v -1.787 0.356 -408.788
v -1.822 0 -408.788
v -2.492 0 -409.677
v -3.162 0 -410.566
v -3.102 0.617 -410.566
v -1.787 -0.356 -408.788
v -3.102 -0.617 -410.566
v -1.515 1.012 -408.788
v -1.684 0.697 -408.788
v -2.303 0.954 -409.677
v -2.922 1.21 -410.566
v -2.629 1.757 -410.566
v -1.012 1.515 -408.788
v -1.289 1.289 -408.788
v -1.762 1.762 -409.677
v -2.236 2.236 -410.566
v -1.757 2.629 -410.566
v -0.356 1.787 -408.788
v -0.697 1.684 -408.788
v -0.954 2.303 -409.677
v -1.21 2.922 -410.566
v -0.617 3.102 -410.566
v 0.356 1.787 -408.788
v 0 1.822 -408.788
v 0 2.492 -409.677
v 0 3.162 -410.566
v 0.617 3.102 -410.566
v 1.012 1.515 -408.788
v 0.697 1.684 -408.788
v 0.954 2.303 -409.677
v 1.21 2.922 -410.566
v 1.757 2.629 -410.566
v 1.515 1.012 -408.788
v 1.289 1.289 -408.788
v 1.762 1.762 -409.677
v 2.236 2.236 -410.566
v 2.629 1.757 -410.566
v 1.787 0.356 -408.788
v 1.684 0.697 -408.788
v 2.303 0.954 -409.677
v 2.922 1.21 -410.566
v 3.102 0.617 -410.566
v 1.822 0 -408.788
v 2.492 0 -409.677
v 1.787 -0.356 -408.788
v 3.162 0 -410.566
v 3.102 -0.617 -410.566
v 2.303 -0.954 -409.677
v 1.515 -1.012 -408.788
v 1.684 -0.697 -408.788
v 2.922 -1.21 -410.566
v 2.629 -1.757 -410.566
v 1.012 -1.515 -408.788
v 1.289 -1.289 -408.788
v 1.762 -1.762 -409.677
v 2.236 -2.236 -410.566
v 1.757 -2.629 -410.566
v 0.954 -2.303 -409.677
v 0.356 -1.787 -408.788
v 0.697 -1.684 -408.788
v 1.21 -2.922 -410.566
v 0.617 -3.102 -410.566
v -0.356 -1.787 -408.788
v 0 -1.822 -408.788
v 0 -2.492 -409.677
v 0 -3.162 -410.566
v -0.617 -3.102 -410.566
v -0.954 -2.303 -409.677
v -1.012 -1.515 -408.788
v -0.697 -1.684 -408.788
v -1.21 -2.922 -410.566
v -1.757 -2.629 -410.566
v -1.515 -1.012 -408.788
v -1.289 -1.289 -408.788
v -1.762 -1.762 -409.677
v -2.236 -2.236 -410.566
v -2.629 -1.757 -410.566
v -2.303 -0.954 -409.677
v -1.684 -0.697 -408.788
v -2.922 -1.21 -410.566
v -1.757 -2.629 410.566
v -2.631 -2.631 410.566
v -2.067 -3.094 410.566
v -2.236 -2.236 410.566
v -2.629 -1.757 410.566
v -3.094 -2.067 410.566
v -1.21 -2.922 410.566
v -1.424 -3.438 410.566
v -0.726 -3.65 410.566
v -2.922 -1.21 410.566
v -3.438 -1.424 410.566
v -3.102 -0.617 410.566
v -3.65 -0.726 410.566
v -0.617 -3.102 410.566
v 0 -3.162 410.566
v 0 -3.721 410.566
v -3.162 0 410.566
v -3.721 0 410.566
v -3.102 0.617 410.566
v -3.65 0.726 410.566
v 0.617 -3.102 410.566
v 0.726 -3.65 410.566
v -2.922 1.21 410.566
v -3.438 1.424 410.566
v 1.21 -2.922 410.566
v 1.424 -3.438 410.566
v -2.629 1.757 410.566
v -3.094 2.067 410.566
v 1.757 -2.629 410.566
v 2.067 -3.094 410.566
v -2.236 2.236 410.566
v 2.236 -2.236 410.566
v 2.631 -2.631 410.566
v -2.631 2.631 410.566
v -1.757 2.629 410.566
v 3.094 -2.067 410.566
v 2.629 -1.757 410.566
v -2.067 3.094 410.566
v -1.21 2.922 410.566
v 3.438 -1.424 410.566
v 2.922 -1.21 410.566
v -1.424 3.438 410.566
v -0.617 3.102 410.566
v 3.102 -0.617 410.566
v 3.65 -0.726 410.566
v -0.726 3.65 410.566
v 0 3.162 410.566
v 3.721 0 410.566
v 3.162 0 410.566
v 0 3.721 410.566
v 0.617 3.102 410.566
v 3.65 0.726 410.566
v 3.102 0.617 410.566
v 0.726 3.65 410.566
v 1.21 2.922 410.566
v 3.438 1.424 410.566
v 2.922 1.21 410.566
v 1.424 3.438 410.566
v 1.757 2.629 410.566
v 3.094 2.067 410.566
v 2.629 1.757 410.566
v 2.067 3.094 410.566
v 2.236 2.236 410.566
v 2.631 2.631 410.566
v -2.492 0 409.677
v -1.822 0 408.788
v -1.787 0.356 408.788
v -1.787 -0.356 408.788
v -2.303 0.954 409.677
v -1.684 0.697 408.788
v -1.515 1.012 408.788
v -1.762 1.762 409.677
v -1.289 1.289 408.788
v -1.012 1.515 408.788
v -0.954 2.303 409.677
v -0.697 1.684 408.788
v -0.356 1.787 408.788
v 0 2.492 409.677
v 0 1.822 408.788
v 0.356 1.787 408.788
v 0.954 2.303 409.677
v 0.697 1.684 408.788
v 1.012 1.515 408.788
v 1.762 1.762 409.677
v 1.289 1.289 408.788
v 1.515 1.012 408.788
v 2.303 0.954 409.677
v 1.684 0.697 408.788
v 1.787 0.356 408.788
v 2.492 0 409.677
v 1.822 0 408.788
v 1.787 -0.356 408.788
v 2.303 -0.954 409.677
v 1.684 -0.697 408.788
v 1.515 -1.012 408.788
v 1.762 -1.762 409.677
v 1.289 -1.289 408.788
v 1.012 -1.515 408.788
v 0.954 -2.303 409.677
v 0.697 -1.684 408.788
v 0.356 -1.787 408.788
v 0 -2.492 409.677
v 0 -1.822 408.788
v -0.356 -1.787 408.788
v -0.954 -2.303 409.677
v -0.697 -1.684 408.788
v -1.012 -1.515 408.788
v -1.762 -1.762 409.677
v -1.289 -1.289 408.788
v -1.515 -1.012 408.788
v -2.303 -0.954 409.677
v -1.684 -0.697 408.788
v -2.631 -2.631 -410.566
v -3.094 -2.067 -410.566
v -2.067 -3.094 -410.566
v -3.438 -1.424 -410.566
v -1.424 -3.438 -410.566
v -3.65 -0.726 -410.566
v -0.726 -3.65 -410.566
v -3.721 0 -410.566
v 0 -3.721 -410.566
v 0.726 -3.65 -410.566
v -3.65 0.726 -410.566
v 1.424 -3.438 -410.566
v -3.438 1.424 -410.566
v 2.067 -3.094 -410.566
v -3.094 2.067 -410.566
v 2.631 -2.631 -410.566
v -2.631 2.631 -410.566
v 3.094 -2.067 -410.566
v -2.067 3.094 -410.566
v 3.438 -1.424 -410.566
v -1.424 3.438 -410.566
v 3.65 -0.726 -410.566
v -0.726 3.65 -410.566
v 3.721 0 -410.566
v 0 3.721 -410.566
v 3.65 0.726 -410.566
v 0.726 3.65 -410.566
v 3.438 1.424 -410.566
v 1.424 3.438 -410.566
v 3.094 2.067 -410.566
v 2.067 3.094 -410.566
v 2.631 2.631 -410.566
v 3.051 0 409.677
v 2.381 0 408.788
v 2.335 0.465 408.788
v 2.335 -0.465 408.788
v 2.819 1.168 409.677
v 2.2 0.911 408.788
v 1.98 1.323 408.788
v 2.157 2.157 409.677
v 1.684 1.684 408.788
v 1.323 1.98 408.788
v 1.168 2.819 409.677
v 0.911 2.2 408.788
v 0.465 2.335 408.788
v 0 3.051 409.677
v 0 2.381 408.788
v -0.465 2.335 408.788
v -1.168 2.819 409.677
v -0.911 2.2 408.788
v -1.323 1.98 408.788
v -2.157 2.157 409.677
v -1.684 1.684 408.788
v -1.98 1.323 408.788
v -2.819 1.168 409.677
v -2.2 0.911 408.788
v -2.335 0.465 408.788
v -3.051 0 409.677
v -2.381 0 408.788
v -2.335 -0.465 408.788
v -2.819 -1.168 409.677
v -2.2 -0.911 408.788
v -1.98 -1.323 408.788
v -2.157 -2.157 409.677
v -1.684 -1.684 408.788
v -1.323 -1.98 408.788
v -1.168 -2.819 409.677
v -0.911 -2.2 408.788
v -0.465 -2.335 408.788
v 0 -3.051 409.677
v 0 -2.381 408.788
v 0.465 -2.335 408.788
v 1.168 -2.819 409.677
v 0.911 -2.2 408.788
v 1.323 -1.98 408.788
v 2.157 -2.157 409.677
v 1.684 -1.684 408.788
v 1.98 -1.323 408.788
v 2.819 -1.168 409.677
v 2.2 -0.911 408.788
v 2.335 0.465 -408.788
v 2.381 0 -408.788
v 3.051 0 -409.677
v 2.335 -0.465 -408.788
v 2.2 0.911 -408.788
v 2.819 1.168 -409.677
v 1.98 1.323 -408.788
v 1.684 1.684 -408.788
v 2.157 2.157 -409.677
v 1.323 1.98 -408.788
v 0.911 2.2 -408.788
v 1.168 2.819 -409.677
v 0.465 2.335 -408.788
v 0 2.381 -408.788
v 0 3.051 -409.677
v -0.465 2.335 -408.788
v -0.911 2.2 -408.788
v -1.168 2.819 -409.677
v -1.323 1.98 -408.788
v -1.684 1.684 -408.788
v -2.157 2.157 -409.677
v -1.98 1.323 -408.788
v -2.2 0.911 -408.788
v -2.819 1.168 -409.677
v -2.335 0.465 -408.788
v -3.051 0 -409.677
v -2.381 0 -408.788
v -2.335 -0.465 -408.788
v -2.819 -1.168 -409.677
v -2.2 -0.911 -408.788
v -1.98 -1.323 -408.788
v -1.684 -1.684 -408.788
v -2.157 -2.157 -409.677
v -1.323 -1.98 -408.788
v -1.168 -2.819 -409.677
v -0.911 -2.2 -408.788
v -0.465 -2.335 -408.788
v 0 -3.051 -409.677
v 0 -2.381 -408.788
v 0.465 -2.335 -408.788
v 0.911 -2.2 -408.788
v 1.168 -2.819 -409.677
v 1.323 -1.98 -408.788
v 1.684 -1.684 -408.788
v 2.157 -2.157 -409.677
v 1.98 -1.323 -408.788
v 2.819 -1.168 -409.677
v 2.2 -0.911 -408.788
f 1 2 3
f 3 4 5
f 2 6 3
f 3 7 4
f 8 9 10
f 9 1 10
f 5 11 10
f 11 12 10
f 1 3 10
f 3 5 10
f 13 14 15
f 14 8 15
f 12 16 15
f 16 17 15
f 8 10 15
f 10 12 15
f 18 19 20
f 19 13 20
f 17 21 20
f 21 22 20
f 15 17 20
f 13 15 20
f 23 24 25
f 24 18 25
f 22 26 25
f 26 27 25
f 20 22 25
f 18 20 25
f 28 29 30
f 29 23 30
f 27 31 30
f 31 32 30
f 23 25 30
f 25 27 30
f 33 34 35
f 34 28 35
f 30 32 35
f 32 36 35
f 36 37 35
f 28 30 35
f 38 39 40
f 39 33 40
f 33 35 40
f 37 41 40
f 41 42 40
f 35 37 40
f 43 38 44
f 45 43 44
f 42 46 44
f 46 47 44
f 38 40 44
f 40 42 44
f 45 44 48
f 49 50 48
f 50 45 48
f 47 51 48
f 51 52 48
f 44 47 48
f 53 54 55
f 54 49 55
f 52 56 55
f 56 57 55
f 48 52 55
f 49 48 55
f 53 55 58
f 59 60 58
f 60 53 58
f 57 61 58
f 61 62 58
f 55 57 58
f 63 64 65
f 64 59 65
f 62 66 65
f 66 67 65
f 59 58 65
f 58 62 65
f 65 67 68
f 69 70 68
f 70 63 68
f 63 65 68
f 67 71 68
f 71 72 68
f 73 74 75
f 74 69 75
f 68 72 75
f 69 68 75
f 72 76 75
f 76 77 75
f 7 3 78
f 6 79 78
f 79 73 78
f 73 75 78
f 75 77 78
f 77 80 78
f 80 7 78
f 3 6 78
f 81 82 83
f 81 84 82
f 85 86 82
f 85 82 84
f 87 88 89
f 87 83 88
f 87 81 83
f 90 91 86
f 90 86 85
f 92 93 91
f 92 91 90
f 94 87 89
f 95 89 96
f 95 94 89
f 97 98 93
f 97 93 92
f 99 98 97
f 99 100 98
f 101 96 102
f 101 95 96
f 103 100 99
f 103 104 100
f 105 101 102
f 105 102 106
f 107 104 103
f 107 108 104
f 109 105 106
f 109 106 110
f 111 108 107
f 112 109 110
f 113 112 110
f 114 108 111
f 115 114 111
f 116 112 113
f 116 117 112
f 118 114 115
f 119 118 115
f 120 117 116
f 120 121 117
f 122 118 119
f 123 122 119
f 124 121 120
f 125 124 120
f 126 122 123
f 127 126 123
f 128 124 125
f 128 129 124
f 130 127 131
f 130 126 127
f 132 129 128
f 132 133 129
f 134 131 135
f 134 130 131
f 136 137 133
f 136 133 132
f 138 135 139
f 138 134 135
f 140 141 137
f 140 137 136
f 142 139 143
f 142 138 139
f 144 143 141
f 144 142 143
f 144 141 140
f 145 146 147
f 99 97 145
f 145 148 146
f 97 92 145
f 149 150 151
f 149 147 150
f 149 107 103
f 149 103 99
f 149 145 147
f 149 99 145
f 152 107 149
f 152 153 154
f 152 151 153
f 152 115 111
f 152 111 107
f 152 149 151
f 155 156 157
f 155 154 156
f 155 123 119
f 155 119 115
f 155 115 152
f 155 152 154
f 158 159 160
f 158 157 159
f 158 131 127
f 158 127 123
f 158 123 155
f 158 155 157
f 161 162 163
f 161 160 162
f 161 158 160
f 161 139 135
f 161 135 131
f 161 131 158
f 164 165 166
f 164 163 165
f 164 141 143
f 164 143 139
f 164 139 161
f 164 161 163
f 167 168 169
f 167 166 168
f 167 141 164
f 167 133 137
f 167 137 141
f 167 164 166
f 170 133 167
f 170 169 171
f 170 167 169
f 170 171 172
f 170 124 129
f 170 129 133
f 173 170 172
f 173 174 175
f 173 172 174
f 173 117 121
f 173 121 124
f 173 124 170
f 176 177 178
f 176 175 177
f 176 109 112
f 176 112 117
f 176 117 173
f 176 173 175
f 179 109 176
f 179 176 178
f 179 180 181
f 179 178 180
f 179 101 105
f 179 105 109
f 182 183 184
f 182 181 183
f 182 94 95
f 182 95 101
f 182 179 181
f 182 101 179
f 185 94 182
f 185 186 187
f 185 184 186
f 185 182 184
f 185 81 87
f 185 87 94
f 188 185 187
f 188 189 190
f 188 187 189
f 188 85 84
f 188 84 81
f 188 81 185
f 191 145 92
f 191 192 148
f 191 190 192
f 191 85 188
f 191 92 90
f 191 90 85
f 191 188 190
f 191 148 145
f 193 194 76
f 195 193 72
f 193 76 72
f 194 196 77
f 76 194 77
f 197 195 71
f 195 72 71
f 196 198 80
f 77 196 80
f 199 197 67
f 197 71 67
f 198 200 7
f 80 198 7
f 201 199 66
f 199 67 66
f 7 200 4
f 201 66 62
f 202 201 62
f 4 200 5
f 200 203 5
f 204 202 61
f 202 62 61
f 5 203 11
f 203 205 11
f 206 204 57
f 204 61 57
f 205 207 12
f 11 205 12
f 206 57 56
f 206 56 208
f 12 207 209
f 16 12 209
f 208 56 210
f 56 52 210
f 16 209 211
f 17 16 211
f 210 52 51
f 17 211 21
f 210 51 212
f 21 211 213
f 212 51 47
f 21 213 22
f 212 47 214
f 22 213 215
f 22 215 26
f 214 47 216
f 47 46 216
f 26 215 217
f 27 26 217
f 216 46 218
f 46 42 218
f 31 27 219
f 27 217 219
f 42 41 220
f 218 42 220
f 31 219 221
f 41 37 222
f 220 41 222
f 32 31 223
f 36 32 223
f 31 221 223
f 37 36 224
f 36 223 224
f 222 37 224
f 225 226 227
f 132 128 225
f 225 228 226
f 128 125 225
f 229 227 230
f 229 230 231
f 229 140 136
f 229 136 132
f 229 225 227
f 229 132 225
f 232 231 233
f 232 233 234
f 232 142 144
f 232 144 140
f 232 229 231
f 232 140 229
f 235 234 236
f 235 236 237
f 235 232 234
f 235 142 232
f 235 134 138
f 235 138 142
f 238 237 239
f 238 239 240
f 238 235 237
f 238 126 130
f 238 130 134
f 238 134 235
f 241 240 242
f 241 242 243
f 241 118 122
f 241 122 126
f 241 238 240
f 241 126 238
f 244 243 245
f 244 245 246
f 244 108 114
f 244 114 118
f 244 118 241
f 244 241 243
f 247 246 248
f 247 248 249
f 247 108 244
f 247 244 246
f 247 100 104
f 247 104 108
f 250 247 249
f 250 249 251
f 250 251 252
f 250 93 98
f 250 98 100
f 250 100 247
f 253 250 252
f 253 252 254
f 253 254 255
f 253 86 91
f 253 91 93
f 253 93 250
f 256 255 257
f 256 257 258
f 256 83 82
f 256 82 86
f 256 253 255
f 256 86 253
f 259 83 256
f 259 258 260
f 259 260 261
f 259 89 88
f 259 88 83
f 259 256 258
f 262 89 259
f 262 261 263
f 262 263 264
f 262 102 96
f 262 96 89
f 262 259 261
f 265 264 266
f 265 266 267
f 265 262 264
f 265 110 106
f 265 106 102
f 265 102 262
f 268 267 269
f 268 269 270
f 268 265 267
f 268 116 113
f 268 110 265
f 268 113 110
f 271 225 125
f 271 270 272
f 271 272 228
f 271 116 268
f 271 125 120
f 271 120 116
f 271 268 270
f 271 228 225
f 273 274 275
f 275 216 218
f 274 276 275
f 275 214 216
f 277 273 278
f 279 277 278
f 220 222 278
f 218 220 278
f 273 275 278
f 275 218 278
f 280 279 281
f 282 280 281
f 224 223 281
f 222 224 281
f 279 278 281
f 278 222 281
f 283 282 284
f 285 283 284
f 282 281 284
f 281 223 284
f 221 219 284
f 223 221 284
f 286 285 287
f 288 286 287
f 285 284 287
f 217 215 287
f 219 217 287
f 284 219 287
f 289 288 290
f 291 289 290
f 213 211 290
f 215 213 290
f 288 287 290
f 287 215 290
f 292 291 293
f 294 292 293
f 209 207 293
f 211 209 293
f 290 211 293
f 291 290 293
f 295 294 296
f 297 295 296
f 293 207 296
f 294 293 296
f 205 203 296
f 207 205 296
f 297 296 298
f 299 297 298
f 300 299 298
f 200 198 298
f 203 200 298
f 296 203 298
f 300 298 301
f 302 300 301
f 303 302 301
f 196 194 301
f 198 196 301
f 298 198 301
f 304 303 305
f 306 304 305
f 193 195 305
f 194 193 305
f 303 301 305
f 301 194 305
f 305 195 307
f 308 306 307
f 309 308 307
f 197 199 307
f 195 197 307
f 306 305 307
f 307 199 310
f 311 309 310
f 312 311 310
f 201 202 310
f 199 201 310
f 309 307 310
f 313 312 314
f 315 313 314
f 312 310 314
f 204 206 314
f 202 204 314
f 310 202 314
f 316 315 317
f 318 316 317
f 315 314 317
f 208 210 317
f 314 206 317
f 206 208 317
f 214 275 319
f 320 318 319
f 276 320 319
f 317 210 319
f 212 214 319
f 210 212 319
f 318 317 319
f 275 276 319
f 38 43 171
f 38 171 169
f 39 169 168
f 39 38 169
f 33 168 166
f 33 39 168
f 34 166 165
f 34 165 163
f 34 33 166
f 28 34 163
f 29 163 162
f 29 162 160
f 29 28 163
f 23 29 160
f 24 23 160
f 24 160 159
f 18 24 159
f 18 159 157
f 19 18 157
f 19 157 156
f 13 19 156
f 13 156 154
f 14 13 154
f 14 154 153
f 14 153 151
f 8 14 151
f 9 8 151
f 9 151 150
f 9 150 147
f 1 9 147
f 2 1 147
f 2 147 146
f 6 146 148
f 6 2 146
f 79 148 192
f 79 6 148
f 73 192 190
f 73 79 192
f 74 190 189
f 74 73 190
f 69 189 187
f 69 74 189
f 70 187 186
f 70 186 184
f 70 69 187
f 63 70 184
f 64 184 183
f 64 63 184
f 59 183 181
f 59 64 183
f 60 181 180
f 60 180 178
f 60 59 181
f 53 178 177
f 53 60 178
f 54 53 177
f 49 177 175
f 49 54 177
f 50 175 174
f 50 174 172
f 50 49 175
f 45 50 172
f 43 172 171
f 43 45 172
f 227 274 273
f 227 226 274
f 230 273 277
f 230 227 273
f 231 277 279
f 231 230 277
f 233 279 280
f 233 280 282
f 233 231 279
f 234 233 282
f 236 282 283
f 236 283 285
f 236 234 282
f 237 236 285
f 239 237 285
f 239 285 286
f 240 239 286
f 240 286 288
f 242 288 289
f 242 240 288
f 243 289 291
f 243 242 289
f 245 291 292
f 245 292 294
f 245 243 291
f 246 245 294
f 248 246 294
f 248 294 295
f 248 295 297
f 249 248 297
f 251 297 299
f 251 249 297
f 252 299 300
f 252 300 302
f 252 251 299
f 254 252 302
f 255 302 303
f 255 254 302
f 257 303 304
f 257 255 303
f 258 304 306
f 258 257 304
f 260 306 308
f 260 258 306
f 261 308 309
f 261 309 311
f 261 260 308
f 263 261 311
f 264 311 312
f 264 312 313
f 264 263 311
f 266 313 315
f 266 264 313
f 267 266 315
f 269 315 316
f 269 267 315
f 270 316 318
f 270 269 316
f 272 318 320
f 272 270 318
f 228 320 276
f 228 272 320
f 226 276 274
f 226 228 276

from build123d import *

# Parameters (mm, degrees)
SKETCH1_R           = 2.38125
SKETCH1_R_2         = 1.82245
BOSS_EXTRUDE1_DEPTH = 408.7876
SKETCH2_R           = 2.38125
BOSS_EXTRUDE2_DEPTH = 1.778
BOSS_EXTRUDE2_TAPER = -37
SKETCH3_R           = 1.82245
CUT_EXTRUDE1_DEPTH  = 2.7780001
CUT_EXTRUDE1_TAPER  = -37


with BuildPart() as part:
    # Sketch1 → Boss-Extrude1 (new body, symmetric)
    with BuildSketch(Plane.XY):
        Circle(SKETCH1_R)
        Circle(SKETCH1_R_2, mode=Mode.SUBTRACT)
    extrude(amount=BOSS_EXTRUDE1_DEPTH, both=True)

    # Sketch2 → Boss-Extrude2 (add)
    with BuildSketch(Plane.XY.offset(408.7876)):
        Circle(SKETCH2_R)
    boss_extrude2 = extrude(amount=BOSS_EXTRUDE2_DEPTH, taper=BOSS_EXTRUDE2_TAPER)

    # Sketch3 → Cut-Extrude1 (cut, through all)
    with BuildSketch(Plane(origin=(0, 0, 408.7876), x_dir=(-1, 0, 0), z_dir=(0, 0, -1))):
        Circle(SKETCH3_R)
    cut_extrude1 = extrude(amount=-CUT_EXTRUDE1_DEPTH, taper=CUT_EXTRUDE1_TAPER, mode=Mode.SUBTRACT)

    # Mirror1: Boss-Extrude2, Cut-Extrude1 across plane
    add(boss_extrude2.mirror(Plane.XY))
    add(cut_extrude1.mirror(Plane.XY), mode=Mode.SUBTRACT)


solid = part.part
